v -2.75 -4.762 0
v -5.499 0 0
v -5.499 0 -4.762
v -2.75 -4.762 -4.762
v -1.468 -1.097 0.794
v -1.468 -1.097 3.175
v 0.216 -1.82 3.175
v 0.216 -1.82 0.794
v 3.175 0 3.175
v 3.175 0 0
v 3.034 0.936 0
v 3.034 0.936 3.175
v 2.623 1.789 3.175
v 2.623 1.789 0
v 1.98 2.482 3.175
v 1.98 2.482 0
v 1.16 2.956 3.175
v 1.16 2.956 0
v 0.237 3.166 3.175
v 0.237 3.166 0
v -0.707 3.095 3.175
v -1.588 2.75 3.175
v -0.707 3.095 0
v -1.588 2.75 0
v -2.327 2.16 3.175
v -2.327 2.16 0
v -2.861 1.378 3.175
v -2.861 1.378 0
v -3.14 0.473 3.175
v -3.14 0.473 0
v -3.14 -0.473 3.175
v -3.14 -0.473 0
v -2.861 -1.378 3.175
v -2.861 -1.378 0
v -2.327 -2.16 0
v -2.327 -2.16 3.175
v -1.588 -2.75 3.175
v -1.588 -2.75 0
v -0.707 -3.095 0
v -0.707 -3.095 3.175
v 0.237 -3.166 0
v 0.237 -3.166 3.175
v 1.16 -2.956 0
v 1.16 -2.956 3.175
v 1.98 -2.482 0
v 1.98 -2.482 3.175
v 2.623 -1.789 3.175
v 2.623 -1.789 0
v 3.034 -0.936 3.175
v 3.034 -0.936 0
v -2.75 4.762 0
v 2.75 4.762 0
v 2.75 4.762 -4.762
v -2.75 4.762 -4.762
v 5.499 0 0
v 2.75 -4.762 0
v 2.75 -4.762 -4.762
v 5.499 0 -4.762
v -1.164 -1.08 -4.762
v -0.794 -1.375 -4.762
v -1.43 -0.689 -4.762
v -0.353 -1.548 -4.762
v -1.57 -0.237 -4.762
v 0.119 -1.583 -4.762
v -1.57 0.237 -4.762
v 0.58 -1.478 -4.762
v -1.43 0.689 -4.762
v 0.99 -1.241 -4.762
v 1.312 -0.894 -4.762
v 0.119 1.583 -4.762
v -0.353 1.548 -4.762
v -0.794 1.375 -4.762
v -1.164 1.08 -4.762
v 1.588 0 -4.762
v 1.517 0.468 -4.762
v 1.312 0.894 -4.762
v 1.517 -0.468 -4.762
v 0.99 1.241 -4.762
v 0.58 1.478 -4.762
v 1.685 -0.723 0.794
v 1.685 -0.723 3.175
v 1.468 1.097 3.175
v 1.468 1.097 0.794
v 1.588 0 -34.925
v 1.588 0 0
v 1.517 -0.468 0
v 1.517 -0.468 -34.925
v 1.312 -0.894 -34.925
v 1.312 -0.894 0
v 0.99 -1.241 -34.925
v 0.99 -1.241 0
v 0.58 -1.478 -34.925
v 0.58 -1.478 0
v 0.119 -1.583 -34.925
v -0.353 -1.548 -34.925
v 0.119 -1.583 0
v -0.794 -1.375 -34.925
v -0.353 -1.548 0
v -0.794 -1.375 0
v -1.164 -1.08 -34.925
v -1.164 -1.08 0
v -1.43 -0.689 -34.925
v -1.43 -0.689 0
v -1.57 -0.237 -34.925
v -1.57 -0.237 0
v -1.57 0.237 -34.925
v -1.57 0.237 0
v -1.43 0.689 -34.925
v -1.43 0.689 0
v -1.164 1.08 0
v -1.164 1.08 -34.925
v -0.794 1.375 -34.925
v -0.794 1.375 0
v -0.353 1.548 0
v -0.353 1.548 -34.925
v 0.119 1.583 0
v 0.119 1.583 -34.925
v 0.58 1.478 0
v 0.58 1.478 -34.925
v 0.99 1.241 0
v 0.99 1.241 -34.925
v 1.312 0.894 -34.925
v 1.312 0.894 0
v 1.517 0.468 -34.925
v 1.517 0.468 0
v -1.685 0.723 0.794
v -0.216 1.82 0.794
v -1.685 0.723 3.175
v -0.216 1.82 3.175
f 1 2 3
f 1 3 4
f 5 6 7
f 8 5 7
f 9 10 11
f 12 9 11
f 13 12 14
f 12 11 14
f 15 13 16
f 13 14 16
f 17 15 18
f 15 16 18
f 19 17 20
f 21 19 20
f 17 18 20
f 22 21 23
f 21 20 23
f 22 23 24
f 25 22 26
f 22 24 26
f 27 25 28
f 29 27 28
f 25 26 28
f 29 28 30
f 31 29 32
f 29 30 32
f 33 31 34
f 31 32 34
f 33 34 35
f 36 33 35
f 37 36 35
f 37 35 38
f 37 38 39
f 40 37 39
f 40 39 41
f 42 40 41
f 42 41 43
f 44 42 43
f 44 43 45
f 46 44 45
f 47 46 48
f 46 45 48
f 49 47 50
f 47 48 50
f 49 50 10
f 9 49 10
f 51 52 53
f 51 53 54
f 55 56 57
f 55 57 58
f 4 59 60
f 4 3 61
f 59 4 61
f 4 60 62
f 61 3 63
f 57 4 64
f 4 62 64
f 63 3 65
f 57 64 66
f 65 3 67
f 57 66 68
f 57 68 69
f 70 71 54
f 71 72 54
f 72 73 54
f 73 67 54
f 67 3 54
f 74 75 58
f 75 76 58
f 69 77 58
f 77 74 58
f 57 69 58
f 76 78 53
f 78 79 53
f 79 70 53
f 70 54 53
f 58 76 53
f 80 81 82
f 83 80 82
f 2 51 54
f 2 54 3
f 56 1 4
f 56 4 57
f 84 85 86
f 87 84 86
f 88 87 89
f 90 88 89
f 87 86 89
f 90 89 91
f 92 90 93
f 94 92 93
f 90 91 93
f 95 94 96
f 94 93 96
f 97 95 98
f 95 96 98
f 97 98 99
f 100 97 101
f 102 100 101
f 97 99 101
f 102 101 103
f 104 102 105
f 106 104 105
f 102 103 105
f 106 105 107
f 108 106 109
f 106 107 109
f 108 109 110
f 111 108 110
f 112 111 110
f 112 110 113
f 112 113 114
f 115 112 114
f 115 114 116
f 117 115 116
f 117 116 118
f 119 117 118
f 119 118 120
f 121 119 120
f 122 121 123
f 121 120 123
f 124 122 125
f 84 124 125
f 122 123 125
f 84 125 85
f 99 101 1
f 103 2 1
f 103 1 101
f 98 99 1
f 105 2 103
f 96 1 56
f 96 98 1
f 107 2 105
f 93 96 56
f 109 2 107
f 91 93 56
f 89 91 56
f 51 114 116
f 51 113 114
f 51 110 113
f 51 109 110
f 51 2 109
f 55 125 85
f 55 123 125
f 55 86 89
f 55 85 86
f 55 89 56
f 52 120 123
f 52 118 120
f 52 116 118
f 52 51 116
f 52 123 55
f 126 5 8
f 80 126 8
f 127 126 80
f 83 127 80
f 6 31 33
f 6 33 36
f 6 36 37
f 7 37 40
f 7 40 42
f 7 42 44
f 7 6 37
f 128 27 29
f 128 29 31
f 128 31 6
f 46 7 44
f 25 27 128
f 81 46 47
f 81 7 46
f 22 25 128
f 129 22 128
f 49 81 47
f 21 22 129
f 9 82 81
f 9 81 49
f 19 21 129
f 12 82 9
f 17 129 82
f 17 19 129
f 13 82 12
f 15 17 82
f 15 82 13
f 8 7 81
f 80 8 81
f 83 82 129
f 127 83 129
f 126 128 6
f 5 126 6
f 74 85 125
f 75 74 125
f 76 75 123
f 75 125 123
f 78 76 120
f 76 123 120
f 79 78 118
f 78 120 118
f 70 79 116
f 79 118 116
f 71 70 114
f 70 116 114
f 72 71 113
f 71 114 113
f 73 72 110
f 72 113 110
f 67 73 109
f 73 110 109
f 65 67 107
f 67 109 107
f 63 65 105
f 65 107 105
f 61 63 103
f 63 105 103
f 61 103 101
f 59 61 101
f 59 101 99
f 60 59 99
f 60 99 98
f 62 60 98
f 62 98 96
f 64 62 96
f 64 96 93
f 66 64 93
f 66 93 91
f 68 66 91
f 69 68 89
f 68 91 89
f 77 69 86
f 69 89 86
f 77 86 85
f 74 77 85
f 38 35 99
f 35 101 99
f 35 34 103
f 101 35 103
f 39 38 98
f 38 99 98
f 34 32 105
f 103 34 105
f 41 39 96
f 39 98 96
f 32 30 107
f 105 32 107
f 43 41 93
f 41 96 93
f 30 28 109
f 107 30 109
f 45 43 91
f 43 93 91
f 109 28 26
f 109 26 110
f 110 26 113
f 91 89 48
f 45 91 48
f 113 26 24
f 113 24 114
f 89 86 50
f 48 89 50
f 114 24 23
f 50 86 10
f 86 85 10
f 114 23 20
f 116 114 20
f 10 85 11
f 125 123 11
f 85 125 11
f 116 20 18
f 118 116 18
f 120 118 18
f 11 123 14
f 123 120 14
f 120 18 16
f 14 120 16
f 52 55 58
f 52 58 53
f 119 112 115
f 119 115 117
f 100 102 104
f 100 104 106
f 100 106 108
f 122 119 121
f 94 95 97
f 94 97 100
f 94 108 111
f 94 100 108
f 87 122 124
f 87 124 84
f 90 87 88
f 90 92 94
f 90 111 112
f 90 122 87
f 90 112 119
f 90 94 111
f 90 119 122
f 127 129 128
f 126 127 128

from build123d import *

# Parameters (mm, degrees)
F0_R      = 1.5875
F1_DEPTH  = 4.7625
F2_R      = 3.175
F3_DEPTH  = 3.175
F4_R      = 1.5875
F5_DEPTH  = 34.925
F7_DEPTH  = 3.048
F9_DEPTH  = 3.175
F11_R     = 1.5875
F12_DEPTH = 25.4
F14_R     = 3.175
F15_DEPTH = 3.175
F16_R     = 1.5875
F17_DEPTH = 34.925
F19_DEPTH = 2.38125


with BuildPart() as f1:
    # F0 (on Top) → F1 (new body)
    with BuildSketch(Plane.XY):
        Polygon((-2.749630657, -4.7625), (2.749630657, -4.7625), (5.499261314, 0), (2.749630657, 4.7625), (-2.749630657, 4.7625), (-5.499261314, 0), align=None)
        Circle(F0_R, mode=Mode.SUBTRACT)
    extrude(amount=-F1_DEPTH)


with BuildPart() as f3:
    # F2 (on Top) → F3 (new body)
    with BuildSketch(Plane.XY):
        Circle(F2_R)
    extrude(amount=F3_DEPTH)

    # F6 (on face) → F7 (join)
    with BuildSketch(Plane.XY.offset(3.175)):
        Polygon((-1.7250356923, 0.6200485413), (-1.3994956345, -1.1839004614), (0.3255400579, -1.8039490026), (1.7250356923, -0.6200485413), (1.3994956345, 1.1839004614), (-0.3255400579, 1.8039490026), align=None)
    extrude(amount=-F7_DEPTH)

    # F8 (on face) → F9 (cut)
    with BuildSketch(Plane.XY.offset(3.175)):
        Polygon((-0.0873734126, -1.8310036101), (1.5420089344, -0.9911694), (1.6293823471, 0.8398342101), (0.0873734126, 1.8310036101), (-1.5420089344, 0.9911694), (-1.6293823471, -0.8398342101), align=None)
    extrude(amount=-F9_DEPTH, mode=Mode.SUBTRACT)


with BuildPart() as f5:
    # F4 (on face) → F5 (new body)
    with BuildSketch(Plane(origin=(0, 0, 0), x_dir=(1, 0, 0), z_dir=(0, 0, -1))):
        Circle(F4_R)
    extrude(amount=F5_DEPTH)


with BuildPart() as f12:
    # F11 (on face) → F12 (new body)
    with BuildSketch(Plane.XY):
        Polygon((5.4008311415, 1.0358078881), (1.8033796262, 5.1951609141), (-3.5974515153, 4.159353026), (-5.4008311415, -1.0358078881), (-1.8033796262, -5.1951609141), (3.5974515153, -4.159353026), align=None)
        Circle(F11_R, mode=Mode.SUBTRACT)
    extrude(amount=F12_DEPTH)


with BuildPart() as f15:
    # F14 (on Top) → F15 (new body)
    with BuildSketch(Plane.XY):
        Circle(F14_R)
    extrude(amount=F15_DEPTH)

    # F16 (on face) → F17 (join)
    with BuildSketch(Plane(origin=(0, 0, 0), x_dir=(1, 0, 0), z_dir=(0, 0, -1))):
        Circle(F16_R)
    extrude(amount=F17_DEPTH)

    # F18 (on face) → F19 (cut)
    with BuildSketch(Plane.XY.offset(3.175)):
        Polygon((-0.216312616, 1.8202794251), (-1.6845645321, 0.7228074919), (-1.4682519161, -1.0974719332), (0.216312616, -1.8202794251), (1.6845645321, -0.7228074919), (1.4682519161, 1.0974719332), align=None)
    extrude(amount=-F19_DEPTH, mode=Mode.SUBTRACT)


solid = Compound([f1.part, f15.part])
